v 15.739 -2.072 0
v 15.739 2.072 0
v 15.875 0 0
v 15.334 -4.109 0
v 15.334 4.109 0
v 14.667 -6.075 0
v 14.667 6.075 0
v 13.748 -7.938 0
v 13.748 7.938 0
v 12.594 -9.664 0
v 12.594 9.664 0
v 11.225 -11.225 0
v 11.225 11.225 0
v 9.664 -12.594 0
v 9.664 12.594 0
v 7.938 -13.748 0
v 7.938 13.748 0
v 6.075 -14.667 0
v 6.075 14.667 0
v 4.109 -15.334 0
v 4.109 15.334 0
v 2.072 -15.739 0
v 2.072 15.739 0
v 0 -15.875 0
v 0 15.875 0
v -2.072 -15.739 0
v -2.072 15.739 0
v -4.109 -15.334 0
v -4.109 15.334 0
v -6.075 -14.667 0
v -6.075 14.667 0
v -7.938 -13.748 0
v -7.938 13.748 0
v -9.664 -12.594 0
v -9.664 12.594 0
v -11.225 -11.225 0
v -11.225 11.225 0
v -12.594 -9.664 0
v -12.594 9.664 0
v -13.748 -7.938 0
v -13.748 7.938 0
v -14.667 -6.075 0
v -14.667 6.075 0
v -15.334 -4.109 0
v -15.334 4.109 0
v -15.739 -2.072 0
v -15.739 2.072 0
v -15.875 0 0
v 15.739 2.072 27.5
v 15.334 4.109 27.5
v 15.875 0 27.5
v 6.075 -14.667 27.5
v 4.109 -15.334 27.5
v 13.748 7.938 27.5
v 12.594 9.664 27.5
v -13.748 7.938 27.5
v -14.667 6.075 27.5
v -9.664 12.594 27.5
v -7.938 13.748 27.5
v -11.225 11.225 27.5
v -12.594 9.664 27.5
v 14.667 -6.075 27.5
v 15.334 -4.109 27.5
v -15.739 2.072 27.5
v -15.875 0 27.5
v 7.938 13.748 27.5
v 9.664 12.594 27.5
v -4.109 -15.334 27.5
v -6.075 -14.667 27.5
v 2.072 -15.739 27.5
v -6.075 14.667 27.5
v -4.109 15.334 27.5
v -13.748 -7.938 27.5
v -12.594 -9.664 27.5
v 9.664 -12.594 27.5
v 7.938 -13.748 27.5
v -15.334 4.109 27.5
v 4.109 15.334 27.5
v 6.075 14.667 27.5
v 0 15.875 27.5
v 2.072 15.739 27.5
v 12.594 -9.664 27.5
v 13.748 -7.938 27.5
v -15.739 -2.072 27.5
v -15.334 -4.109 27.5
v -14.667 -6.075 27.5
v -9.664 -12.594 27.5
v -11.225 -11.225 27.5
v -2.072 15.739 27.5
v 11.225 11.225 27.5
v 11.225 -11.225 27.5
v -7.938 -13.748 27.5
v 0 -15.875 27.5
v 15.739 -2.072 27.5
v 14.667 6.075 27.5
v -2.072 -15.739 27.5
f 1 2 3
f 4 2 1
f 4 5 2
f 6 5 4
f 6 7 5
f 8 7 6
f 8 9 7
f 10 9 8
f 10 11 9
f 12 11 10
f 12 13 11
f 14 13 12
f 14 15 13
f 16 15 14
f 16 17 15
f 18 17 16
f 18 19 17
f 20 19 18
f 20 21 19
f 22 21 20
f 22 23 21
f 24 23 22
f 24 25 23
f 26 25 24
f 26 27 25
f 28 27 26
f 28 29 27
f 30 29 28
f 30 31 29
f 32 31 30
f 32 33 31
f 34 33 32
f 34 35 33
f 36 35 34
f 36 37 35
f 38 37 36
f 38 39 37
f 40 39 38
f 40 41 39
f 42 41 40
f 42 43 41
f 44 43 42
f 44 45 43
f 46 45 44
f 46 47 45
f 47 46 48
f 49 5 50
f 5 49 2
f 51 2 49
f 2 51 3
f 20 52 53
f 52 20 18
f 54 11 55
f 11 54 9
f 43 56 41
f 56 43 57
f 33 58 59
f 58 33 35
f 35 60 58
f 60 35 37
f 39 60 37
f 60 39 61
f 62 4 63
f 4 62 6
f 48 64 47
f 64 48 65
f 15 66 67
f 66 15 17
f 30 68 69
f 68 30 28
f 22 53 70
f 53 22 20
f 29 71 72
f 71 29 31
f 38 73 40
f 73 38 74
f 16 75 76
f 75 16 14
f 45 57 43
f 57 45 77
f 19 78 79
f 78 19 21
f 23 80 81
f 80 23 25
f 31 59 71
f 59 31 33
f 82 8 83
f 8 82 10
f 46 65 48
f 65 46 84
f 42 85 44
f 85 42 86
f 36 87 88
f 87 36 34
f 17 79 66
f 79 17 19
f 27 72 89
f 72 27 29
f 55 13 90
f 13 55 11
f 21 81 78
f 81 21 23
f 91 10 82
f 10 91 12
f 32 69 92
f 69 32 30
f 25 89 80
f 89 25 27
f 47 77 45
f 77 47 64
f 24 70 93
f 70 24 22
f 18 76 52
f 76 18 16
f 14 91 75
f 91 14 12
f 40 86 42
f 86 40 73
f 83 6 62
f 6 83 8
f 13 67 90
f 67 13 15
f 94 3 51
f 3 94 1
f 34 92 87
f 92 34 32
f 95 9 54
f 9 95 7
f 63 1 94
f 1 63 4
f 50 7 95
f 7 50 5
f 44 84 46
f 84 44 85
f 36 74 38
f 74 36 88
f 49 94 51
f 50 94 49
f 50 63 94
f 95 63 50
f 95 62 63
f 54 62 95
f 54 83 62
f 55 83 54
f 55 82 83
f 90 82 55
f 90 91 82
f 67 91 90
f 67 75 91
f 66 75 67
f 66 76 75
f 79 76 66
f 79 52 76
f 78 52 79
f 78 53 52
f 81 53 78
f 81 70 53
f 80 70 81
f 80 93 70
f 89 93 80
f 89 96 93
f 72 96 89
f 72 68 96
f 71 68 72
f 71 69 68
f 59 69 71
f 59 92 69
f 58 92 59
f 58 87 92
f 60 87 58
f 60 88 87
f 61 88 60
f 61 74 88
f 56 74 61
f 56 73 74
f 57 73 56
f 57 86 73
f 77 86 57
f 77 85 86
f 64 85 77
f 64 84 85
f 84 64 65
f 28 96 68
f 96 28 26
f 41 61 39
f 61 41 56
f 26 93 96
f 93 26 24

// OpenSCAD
// concept_A.scad — CONCEPT A "Refined slotted cube + flying leads" (baseline, §F seed S4)
// -----------------------------------------------------------------------------
// The user's slotted-cube idea made buildable:
//   - 15 mm zirconia cube; per face an OPEN-FRONT vertical slot (not an enclosed
//     internal cavity like his CAD): carrier slides DOWN from the top edge,
//     riding on two edge rails that touch ONLY the outer 0.4 mm rim of the
//     carrier back face -- die/bond wires face OUT through a 7.0 mm window
//   - BeCu bow spring at the slot back preloads the carrier against the rails
//   - Ti keeper strip across the top of each slot (1 screw) stops back-out
//   - ELECTRICAL: no contacts in the mount -- four 34 AWG Kapton-insulated
//     flying leads are pre-attached (vacuum-grade solder or parallel-gap weld)
//     to castellations 1/6/11/16 of each carrier BEFORE insertion and exit
//     through the top slot mouth. Carrier is mechanically reusable; the lead
//     attachment is semi-permanent -> fails the strict reusability gate.
// Render: openscad -o concept_A_iso.png --imgsize=1400,1050 --projection=p \
//         --camera=0,0,0,55,0,25,0 --viewall --autocenter concept_A.scad
// -----------------------------------------------------------------------------

SECTION = 0;

ENV_D = 31.75; ENV_H = 27.5; show_envelope = true;
LCC = 8.89; LCC_T = 1.65; CAV_OP = 6.10;

CUBE   = 15.0;
SLOT_W = 9.30;      // slot width across carrier (LCC max 9.14 + clearance)
SLOT_T = 2.60;      // slot depth into face: carrier 1.65 + bow spring 0.95
WIN    = 7.0;       // front window (die + bond wires look out through this)
RAIL   = 0.9;       // rail overlap on the carrier front rim (outside seal ring)
STAND_H= 6.5; BASE_T= 2.0; BASE_D = 18.0; EAR_Y = 12.5;
Z0 = STAND_H + BASE_T; ZC = Z0 + CUBE/2;

echo(str("cube corner radius = ", CUBE*sqrt(2)/2, " mm (<= ", ENV_D/2, ")"));
echo(str("stack height = ", Z0 + CUBE + 1.5, " mm (<= ", ENV_H, ")"));

$fn = 48;
module envelope() { color([0.8,0.1,0.1,0.10]) cylinder(h=ENV_H, d=ENV_D); }

// local coords: face at z=CUBE/2, +z out; slot opens toward +y (local "up")
module slot_cuts() {
  // slot body: from just behind the window rails to depth SLOT_T
  translate([0,1,CUBE/2-SLOT_T/2-RAIL/2+0.01])
    cube([SLOT_W, CUBE/2+SLOT_W/2-2, SLOT_T+0.02], center=true);
  // front window (rails remain each side, width (SLOT_W-WIN)/2)
  translate([0,0,CUBE/2-RAIL/2+0.01]) cube([WIN, WIN, RAIL+0.04], center=true);
  // slot mouth at the top edge (insertion + lead exit)
  translate([0,CUBE/2-1.5,CUBE/2-SLOT_T/2-RAIL/2])
    cube([SLOT_W, 3.2, SLOT_T+0.02], center=true);
  // keeper screw hole
  translate([0,CUBE/2-2.2,CUBE/2-RAIL-SLOT_T]) cylinder(h=6, d=1.8);
}

module carrier_in_slot() {
  // carrier sits behind the rails, cavity facing OUT (local +z)
  translate([0,0,CUBE/2-RAIL-LCC_T]) {
    color([1,0.95,0.72]) difference() {
      linear_extrude(LCC_T) square(LCC, center=true);
      translate([0,0,LCC_T-0.75]) linear_extrude(1) square(CAV_OP, center=true);
      translate([0,0,LCC_T-1.15]) linear_extrude(1) square(4.06, center=true);
    }
    color([0.25,0.28,0.32]) translate([0,0,0.6]) linear_extrude(0.35) square(2.5, center=true);
  }
  // bow spring behind the carrier
  color([1.0,0.84,0.2]) translate([0,0,CUBE/2-RAIL-LCC_T-0.5])
    linear_extrude(0.4) square([2.5, LCC-1], center=true);
  // 4 flying leads out the slot mouth (schematic)
  color([0.85,0.55,0.25]) for (i=[-1.5:1:1.5])
    translate([i*1.2, LCC/2+0.2, CUBE/2-RAIL-LCC_T+0.6])
      rotate([-90,0,0]) cylinder(h=CUBE/2-LCC/2+2, d=0.4);
  // Ti keeper strip
  color([0.62,0.65,0.68]) translate([0,CUBE/2-2.2,CUBE/2-0.01])
    linear_extrude(0.8) difference() { square([SLOT_W+2,2.6], center=true); circle(d=1.8); }
  color([0.55,0.58,0.62]) translate([0,CUBE/2-2.2,CUBE/2+0.79]) cylinder(h=1.0, d=3.0);
}

module on_px() { translate([0,0,ZC]) rotate([0, 90,0]) rotate([0,0,90]) children(); }
module on_py() { translate([0,0,ZC]) rotate([-90,0,0]) rotate([0,0,180]) children(); }
module on_pz() { translate([0,0,ZC]) children(); }

module zirconia_body() color([0.93,0.92,0.86]) difference() {
  union() {
    translate([0,0,ZC]) cube(CUBE, center=true);
    translate([0,0,STAND_H]) cylinder(h=BASE_T, d=BASE_D);
    for (s=[1,-1]) translate([0,0,STAND_H]) linear_extrude(BASE_T) hull() {
      translate([0, s*EAR_Y]) circle(d=5); translate([0, s*7]) circle(d=5); }
  }
  on_px() slot_cuts();
  on_py() slot_cuts();
  on_pz() slot_cuts();
  for (s=[1,-1]) translate([0,s*EAR_Y,STAND_H-1]) cylinder(h=BASE_T+2, d=2.2);
}

module standoffs() color([0.55,0.58,0.62]) for (s=[1,-1])
  translate([0,s*EAR_Y,0]) { cylinder(h=STAND_H, d=4.8, $fn=6);
    translate([0,0,STAND_H]) cylinder(h=BASE_T+1.0, d=2.0); }

module assembly() {
  standoffs(); zirconia_body();
  on_px() carrier_in_slot();
  on_py() carrier_in_slot();
  on_pz() carrier_in_slot();
}

difference() {
  union() { assembly(); if (show_envelope && SECTION==0) envelope(); }
  if (SECTION) translate([-50,-100,-10]) cube([100,100,60]);
}
